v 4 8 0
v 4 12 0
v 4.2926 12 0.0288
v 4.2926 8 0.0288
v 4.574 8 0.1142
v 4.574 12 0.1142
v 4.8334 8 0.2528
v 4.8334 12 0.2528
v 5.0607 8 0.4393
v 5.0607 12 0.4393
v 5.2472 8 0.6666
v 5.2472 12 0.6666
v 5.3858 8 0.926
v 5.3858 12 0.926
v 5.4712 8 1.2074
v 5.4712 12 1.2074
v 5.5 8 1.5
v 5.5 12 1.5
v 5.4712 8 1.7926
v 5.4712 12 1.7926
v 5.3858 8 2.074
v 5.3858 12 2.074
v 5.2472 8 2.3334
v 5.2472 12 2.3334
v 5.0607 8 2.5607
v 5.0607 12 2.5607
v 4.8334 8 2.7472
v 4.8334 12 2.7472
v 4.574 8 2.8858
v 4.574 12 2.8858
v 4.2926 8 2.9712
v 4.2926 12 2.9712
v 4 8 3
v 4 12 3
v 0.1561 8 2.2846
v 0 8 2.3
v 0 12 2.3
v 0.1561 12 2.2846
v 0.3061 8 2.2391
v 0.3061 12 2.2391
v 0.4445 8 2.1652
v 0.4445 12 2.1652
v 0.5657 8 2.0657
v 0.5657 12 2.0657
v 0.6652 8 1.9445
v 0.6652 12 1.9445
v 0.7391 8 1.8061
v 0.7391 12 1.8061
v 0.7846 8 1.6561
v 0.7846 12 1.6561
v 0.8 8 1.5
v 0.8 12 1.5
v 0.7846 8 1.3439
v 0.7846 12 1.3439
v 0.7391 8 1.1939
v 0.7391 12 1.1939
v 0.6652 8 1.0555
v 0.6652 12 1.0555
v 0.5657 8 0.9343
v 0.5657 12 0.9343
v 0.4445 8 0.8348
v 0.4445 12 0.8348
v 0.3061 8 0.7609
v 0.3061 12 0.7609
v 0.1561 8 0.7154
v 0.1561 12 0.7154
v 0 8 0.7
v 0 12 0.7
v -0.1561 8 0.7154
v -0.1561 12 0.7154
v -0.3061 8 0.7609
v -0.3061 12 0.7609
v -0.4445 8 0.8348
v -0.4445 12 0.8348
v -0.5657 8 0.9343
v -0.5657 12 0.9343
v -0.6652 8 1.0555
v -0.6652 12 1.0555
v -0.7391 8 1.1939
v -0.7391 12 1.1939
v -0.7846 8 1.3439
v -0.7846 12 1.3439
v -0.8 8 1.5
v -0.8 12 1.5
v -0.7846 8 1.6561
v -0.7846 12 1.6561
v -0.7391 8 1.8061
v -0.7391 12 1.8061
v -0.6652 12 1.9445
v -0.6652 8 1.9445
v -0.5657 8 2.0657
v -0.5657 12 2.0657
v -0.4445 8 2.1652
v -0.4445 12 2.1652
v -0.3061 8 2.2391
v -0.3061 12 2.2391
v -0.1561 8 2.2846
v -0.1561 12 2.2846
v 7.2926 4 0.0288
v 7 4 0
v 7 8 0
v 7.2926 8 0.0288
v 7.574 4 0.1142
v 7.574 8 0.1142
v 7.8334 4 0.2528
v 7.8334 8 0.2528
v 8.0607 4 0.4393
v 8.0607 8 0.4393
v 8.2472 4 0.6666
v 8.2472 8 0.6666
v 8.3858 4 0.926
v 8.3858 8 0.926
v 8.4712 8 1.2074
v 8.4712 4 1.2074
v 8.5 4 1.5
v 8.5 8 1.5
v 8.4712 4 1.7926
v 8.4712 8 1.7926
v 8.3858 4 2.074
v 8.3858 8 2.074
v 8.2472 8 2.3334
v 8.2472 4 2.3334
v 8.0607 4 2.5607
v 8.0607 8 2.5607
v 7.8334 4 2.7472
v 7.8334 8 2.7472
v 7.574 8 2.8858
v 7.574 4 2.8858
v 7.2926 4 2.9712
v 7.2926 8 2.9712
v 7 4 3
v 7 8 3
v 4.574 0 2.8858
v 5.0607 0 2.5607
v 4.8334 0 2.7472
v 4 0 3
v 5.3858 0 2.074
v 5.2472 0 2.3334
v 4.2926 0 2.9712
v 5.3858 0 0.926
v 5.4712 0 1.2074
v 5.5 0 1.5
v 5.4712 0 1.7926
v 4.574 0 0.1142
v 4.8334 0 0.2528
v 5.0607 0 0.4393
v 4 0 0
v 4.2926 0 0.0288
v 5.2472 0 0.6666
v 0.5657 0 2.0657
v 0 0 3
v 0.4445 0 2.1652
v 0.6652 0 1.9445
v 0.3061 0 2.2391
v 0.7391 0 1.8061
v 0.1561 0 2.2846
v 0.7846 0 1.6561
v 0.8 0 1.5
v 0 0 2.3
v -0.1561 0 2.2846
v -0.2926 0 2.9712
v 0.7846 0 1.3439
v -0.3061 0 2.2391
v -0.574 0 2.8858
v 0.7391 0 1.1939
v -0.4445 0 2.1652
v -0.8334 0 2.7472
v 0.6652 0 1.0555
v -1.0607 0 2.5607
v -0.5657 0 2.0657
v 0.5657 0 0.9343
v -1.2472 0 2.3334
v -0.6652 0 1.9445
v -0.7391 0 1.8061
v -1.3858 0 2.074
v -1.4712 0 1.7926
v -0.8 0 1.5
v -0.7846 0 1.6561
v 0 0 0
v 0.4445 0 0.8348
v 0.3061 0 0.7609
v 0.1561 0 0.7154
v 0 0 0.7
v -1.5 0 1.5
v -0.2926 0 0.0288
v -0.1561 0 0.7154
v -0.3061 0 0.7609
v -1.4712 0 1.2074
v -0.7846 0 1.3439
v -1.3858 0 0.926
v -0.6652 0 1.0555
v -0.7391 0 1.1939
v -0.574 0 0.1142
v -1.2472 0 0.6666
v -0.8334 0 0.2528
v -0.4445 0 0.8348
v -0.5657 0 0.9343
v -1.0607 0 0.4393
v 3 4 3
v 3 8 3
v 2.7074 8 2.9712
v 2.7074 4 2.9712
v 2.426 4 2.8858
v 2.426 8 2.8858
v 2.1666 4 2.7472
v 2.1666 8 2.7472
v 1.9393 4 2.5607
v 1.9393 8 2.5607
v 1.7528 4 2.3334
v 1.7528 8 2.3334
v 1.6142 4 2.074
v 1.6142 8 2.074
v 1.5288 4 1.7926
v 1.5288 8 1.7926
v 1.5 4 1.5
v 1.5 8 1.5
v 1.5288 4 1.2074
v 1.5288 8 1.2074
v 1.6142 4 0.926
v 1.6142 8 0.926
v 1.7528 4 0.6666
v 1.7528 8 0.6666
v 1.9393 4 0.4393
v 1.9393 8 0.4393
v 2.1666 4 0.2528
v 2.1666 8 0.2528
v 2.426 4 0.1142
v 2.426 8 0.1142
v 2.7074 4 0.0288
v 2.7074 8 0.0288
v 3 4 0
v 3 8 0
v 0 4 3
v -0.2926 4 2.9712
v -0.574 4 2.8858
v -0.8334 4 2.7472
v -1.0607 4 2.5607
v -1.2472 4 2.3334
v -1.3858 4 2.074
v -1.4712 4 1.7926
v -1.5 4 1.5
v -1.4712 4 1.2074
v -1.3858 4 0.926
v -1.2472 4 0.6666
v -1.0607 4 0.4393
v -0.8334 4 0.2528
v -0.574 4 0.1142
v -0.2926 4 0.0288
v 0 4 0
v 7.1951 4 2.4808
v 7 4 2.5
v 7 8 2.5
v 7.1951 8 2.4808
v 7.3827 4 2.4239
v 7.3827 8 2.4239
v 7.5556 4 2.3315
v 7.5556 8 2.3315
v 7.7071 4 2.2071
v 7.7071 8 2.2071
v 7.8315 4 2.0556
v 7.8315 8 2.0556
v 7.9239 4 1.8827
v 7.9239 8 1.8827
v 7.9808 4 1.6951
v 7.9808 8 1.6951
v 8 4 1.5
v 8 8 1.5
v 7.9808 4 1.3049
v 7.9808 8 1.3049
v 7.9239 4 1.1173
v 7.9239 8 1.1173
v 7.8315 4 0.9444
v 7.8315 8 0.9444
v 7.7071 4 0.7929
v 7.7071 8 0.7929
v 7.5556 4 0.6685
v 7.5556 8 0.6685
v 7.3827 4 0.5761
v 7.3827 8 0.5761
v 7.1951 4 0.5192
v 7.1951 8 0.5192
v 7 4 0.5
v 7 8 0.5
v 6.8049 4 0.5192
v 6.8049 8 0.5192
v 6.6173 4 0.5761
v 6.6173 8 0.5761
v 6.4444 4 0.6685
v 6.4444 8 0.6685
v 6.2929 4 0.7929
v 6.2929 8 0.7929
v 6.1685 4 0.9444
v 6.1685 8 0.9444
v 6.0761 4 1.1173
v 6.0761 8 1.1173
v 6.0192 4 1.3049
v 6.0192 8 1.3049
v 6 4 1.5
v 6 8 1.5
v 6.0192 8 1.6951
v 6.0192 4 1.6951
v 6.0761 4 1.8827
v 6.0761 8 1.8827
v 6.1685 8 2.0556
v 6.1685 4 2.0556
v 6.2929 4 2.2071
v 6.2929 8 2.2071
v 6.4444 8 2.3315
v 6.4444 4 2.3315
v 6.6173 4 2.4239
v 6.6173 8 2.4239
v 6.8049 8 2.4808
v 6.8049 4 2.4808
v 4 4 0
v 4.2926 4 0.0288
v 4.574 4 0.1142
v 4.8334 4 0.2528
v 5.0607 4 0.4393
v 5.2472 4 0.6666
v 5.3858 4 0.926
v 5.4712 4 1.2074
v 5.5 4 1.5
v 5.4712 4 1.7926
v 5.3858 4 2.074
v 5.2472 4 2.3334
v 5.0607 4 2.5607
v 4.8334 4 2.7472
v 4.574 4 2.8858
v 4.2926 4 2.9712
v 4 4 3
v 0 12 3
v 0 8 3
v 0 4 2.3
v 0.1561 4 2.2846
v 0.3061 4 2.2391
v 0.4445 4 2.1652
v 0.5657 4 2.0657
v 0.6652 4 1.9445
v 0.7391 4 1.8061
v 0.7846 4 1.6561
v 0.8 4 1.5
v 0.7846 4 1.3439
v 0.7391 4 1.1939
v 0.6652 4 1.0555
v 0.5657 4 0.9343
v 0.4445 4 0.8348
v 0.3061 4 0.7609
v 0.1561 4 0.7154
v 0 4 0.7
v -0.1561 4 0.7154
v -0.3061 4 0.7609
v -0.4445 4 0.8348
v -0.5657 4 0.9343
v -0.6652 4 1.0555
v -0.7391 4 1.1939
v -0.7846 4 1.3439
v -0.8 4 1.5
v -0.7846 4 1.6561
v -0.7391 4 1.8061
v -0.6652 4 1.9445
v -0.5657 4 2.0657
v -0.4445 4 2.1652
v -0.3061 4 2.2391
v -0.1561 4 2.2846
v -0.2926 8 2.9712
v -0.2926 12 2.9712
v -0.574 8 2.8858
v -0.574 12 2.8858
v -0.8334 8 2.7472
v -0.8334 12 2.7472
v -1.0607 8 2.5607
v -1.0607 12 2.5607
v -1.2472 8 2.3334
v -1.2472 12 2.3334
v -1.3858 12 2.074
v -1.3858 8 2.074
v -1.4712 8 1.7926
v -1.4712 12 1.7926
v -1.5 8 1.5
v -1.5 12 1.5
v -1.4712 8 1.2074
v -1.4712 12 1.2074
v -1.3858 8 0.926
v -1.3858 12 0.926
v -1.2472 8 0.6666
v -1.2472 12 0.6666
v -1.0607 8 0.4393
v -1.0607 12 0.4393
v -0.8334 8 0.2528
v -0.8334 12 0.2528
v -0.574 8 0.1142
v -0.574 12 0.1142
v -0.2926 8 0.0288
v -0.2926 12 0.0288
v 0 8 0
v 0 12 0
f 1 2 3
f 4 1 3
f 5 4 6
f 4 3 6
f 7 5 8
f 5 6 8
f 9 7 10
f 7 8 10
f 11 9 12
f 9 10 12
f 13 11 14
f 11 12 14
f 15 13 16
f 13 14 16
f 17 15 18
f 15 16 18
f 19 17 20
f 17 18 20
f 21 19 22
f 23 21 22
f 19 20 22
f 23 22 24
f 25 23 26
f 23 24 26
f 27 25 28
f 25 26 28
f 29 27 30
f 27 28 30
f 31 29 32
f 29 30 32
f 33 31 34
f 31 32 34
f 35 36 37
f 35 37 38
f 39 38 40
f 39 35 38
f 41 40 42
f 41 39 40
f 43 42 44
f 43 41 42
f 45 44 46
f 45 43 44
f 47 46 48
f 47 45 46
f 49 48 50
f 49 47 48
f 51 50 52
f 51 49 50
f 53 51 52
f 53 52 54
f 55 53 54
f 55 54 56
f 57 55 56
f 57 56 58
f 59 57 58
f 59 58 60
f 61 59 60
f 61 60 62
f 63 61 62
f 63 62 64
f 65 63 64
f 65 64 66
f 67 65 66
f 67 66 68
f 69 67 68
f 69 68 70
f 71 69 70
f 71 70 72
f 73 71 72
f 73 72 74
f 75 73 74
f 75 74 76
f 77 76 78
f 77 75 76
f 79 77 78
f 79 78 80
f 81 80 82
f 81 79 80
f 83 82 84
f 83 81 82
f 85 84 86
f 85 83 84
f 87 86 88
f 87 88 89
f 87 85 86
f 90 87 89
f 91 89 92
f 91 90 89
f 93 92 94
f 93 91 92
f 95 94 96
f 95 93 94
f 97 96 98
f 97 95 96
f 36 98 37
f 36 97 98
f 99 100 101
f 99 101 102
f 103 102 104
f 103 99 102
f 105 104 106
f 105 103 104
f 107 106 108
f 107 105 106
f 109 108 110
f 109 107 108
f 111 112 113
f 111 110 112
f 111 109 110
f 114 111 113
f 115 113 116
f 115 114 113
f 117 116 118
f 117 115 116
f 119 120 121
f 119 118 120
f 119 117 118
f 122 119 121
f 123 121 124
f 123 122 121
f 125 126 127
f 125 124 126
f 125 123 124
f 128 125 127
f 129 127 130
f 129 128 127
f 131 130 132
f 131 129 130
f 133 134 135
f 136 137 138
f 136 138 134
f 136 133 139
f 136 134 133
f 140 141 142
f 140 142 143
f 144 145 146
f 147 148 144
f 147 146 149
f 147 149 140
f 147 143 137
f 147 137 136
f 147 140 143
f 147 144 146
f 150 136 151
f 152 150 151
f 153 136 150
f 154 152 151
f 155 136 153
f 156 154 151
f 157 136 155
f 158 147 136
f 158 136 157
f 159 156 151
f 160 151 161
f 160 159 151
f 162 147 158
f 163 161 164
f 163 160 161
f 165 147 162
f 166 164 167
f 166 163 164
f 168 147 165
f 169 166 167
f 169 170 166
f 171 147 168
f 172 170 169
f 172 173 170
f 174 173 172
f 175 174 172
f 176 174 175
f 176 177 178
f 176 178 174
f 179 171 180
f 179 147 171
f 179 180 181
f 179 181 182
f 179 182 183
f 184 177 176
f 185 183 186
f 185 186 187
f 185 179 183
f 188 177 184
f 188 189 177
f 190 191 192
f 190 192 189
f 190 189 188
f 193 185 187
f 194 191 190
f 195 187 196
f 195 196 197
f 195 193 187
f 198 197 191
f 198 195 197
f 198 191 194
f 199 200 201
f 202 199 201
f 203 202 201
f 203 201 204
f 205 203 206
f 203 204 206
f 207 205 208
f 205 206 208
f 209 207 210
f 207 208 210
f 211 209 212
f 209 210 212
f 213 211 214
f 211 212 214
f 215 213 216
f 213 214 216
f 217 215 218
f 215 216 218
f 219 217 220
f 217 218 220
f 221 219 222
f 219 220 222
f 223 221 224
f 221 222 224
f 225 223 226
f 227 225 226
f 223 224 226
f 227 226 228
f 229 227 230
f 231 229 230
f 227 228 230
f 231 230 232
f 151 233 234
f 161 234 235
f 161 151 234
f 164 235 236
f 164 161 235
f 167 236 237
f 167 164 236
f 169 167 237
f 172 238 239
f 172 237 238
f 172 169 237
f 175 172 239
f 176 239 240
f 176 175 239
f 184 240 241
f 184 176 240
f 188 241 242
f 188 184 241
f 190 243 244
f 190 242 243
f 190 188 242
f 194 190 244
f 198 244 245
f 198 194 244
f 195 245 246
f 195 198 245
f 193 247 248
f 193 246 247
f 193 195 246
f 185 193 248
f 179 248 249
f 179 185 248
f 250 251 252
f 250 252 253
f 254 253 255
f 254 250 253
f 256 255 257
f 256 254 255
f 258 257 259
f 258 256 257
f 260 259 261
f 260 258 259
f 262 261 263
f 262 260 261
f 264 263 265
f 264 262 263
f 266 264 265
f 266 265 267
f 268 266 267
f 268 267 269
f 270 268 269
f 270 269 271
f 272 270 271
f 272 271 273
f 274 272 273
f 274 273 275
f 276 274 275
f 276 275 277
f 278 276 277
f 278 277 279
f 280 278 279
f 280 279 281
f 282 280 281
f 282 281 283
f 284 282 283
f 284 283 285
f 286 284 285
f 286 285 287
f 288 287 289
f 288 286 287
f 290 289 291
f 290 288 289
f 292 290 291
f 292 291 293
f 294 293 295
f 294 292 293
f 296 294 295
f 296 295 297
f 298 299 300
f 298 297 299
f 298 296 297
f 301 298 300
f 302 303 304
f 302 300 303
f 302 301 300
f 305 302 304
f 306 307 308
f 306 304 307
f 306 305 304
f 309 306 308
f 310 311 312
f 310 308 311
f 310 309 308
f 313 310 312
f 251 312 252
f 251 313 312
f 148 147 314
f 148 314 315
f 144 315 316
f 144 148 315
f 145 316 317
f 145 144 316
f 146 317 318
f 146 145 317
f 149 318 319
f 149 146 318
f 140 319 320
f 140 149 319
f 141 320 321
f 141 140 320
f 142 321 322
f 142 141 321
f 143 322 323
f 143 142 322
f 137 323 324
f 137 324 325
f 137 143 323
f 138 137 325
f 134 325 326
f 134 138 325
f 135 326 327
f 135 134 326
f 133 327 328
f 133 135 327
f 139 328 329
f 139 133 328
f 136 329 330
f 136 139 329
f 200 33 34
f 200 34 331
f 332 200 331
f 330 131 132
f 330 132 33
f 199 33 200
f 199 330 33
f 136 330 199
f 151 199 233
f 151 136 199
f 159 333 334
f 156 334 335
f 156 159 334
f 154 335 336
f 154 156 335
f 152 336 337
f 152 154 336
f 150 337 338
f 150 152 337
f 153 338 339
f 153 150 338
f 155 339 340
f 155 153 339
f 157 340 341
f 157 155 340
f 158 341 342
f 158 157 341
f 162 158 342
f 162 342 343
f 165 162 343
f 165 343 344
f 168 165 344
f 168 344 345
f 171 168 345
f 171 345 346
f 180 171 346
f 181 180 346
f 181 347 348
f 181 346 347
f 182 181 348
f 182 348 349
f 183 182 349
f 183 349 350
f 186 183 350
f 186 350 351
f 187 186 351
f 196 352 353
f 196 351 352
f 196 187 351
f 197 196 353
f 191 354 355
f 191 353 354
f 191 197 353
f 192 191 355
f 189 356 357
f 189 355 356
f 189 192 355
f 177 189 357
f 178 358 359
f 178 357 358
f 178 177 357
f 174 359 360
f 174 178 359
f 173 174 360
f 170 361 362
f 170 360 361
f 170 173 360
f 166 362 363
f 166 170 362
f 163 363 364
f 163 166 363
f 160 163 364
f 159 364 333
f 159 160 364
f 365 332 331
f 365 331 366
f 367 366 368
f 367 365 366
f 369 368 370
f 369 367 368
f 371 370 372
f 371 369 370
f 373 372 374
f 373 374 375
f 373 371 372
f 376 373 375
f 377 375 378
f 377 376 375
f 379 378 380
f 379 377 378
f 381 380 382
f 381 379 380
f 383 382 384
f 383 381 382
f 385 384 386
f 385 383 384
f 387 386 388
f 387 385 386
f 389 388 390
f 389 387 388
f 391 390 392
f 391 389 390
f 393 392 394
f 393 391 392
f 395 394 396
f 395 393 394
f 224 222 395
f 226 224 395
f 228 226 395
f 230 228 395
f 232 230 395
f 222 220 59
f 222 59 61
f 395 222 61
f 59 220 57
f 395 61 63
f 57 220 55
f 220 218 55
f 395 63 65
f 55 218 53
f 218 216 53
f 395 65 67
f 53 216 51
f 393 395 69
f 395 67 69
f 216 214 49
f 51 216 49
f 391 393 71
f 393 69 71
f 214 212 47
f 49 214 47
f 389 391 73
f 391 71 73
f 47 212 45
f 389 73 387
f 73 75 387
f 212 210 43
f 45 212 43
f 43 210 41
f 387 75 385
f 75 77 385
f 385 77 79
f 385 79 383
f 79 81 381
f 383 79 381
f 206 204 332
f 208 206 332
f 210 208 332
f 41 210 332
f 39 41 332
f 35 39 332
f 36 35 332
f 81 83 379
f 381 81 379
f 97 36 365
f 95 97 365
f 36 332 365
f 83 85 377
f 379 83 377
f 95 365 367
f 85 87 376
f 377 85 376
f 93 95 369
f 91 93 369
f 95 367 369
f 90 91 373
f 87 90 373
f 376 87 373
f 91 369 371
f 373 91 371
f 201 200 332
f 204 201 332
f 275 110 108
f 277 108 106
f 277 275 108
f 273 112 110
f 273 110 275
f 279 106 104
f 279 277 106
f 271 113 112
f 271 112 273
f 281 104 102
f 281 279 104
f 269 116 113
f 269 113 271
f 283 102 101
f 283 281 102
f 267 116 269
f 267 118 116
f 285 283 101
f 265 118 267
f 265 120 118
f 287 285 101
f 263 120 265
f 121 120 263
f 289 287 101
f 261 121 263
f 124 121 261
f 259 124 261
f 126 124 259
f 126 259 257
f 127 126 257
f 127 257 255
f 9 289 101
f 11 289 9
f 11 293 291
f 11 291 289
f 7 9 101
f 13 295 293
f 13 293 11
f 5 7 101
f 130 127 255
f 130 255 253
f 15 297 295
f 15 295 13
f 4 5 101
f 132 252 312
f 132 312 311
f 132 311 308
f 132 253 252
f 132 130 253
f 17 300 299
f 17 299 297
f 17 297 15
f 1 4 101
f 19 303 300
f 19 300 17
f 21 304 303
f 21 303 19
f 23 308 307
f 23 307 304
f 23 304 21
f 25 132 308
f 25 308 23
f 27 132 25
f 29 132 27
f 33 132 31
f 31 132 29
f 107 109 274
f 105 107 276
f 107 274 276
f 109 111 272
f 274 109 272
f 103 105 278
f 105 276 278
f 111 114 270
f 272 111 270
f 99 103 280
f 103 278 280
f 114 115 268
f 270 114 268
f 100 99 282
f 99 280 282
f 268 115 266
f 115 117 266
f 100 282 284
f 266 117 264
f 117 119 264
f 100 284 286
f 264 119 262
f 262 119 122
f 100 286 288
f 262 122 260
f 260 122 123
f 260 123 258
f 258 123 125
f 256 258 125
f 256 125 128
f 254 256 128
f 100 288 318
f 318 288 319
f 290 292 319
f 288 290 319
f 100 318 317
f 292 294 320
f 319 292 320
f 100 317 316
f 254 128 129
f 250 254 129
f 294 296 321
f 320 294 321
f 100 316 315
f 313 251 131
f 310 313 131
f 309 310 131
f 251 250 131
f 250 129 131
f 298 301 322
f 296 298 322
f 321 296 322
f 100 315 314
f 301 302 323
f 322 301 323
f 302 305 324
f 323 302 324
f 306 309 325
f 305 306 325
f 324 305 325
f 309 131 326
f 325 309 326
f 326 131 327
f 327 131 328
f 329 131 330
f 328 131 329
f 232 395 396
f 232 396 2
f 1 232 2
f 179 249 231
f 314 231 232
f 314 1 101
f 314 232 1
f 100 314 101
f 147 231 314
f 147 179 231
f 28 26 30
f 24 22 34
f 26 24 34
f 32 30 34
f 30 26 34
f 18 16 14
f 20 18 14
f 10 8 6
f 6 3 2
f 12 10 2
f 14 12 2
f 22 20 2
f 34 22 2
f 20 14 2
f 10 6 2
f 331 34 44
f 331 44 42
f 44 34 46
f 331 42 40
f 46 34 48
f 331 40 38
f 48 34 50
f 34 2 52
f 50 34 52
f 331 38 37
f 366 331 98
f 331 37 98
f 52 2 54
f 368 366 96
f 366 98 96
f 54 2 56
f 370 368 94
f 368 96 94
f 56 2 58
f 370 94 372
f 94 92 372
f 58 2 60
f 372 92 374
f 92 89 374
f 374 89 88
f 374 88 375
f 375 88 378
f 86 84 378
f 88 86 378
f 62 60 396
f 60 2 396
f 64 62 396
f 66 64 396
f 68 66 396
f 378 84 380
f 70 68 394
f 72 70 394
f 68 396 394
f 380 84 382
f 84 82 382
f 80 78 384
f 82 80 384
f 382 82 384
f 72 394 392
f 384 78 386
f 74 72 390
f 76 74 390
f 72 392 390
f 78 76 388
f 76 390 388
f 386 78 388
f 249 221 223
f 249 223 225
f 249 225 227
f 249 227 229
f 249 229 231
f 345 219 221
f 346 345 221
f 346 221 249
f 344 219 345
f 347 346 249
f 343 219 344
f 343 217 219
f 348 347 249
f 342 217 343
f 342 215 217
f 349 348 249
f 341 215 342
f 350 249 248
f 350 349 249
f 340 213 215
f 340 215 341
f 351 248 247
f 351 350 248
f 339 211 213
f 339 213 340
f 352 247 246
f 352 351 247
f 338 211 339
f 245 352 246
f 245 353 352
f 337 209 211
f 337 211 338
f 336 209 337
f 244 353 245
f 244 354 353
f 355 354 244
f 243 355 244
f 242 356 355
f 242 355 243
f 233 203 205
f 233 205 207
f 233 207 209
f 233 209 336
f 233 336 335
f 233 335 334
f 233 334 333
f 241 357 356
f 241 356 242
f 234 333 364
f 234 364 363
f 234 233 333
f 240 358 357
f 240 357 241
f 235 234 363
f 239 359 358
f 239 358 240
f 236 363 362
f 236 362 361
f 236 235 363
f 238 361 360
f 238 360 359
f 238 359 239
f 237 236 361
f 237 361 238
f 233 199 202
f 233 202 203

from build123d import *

# Parameters (mm, degrees)
SKETCH_2_R               = 0.8
SKETCH_2_R_2             = 1
EXTRUDE_1_DEPTH          = 12
CUT_EXTRUDE_1_DEPTH      = 4
CUT_EXTRUDE_2_DEPTH      = 2
CUT_EXTRUDE_2_DEPTH_BACK = 2


with BuildPart() as part:
    # 草图2 → 凸台-拉伸1 (new body)
    with BuildSketch(Plane(origin=(0, 0, 0), x_dir=(1, 0, 0), z_dir=(0, 1, 0))):
        with BuildLine():
            Line((0, 0), (7, 0))
            ThreePointArc((7, 0), (8.5, -1.5), (7, -3))
            Line((7, -3), (0, -3))
            ThreePointArc((0, -3), (-1.5, -1.5), (0, 0))
        make_face()
        with Locations(Location((0, -1.5, 0), (0, 0, 270))):
            Circle(SKETCH_2_R, mode=Mode.SUBTRACT)
        with Locations(Location((7, -1.5, 0), (0, 0, 270))):
            Circle(SKETCH_2_R_2, mode=Mode.SUBTRACT)
    extrude(amount=EXTRUDE_1_DEPTH)

    # 草图4 → 切除-拉伸1 (cut)
    with BuildSketch(Plane.XZ):
        with BuildLine():
            Line((7, 0), (4, 0))
            ThreePointArc((4, 0), (5.5, 1.5), (4, 3))
            Line((4, 3), (7, 3))
            ThreePointArc((7, 3), (8.5, 1.5), (7, 0))
        make_face()
    cut_extrude_1 = extrude(amount=-CUT_EXTRUDE_1_DEPTH, mode=Mode.SUBTRACT)

    # 镜向1: 切除-拉伸1 across plane
    add(cut_extrude_1.mirror(Plane(origin=(0, 6, 0), x_dir=(0, 0, 1), z_dir=(0, -1, 0))), mode=Mode.SUBTRACT)

    # 草图5 → 切除-拉伸2 (cut, two sides: drawn at the far end of the back side and taken through both)
    with BuildSketch(Plane.XZ.offset(-6).offset(-CUT_EXTRUDE_2_DEPTH_BACK)):
        with BuildLine():
            Line((0, 3), (3, 3))
            ThreePointArc((3, 3), (1.5, 1.5), (3, 0))
            Line((3, 0), (0, 0))
            ThreePointArc((0, 0), (-1.5, 1.5), (0, 3))
        make_face()
    extrude(amount=CUT_EXTRUDE_2_DEPTH + CUT_EXTRUDE_2_DEPTH_BACK, mode=Mode.SUBTRACT)


solid = part.part
